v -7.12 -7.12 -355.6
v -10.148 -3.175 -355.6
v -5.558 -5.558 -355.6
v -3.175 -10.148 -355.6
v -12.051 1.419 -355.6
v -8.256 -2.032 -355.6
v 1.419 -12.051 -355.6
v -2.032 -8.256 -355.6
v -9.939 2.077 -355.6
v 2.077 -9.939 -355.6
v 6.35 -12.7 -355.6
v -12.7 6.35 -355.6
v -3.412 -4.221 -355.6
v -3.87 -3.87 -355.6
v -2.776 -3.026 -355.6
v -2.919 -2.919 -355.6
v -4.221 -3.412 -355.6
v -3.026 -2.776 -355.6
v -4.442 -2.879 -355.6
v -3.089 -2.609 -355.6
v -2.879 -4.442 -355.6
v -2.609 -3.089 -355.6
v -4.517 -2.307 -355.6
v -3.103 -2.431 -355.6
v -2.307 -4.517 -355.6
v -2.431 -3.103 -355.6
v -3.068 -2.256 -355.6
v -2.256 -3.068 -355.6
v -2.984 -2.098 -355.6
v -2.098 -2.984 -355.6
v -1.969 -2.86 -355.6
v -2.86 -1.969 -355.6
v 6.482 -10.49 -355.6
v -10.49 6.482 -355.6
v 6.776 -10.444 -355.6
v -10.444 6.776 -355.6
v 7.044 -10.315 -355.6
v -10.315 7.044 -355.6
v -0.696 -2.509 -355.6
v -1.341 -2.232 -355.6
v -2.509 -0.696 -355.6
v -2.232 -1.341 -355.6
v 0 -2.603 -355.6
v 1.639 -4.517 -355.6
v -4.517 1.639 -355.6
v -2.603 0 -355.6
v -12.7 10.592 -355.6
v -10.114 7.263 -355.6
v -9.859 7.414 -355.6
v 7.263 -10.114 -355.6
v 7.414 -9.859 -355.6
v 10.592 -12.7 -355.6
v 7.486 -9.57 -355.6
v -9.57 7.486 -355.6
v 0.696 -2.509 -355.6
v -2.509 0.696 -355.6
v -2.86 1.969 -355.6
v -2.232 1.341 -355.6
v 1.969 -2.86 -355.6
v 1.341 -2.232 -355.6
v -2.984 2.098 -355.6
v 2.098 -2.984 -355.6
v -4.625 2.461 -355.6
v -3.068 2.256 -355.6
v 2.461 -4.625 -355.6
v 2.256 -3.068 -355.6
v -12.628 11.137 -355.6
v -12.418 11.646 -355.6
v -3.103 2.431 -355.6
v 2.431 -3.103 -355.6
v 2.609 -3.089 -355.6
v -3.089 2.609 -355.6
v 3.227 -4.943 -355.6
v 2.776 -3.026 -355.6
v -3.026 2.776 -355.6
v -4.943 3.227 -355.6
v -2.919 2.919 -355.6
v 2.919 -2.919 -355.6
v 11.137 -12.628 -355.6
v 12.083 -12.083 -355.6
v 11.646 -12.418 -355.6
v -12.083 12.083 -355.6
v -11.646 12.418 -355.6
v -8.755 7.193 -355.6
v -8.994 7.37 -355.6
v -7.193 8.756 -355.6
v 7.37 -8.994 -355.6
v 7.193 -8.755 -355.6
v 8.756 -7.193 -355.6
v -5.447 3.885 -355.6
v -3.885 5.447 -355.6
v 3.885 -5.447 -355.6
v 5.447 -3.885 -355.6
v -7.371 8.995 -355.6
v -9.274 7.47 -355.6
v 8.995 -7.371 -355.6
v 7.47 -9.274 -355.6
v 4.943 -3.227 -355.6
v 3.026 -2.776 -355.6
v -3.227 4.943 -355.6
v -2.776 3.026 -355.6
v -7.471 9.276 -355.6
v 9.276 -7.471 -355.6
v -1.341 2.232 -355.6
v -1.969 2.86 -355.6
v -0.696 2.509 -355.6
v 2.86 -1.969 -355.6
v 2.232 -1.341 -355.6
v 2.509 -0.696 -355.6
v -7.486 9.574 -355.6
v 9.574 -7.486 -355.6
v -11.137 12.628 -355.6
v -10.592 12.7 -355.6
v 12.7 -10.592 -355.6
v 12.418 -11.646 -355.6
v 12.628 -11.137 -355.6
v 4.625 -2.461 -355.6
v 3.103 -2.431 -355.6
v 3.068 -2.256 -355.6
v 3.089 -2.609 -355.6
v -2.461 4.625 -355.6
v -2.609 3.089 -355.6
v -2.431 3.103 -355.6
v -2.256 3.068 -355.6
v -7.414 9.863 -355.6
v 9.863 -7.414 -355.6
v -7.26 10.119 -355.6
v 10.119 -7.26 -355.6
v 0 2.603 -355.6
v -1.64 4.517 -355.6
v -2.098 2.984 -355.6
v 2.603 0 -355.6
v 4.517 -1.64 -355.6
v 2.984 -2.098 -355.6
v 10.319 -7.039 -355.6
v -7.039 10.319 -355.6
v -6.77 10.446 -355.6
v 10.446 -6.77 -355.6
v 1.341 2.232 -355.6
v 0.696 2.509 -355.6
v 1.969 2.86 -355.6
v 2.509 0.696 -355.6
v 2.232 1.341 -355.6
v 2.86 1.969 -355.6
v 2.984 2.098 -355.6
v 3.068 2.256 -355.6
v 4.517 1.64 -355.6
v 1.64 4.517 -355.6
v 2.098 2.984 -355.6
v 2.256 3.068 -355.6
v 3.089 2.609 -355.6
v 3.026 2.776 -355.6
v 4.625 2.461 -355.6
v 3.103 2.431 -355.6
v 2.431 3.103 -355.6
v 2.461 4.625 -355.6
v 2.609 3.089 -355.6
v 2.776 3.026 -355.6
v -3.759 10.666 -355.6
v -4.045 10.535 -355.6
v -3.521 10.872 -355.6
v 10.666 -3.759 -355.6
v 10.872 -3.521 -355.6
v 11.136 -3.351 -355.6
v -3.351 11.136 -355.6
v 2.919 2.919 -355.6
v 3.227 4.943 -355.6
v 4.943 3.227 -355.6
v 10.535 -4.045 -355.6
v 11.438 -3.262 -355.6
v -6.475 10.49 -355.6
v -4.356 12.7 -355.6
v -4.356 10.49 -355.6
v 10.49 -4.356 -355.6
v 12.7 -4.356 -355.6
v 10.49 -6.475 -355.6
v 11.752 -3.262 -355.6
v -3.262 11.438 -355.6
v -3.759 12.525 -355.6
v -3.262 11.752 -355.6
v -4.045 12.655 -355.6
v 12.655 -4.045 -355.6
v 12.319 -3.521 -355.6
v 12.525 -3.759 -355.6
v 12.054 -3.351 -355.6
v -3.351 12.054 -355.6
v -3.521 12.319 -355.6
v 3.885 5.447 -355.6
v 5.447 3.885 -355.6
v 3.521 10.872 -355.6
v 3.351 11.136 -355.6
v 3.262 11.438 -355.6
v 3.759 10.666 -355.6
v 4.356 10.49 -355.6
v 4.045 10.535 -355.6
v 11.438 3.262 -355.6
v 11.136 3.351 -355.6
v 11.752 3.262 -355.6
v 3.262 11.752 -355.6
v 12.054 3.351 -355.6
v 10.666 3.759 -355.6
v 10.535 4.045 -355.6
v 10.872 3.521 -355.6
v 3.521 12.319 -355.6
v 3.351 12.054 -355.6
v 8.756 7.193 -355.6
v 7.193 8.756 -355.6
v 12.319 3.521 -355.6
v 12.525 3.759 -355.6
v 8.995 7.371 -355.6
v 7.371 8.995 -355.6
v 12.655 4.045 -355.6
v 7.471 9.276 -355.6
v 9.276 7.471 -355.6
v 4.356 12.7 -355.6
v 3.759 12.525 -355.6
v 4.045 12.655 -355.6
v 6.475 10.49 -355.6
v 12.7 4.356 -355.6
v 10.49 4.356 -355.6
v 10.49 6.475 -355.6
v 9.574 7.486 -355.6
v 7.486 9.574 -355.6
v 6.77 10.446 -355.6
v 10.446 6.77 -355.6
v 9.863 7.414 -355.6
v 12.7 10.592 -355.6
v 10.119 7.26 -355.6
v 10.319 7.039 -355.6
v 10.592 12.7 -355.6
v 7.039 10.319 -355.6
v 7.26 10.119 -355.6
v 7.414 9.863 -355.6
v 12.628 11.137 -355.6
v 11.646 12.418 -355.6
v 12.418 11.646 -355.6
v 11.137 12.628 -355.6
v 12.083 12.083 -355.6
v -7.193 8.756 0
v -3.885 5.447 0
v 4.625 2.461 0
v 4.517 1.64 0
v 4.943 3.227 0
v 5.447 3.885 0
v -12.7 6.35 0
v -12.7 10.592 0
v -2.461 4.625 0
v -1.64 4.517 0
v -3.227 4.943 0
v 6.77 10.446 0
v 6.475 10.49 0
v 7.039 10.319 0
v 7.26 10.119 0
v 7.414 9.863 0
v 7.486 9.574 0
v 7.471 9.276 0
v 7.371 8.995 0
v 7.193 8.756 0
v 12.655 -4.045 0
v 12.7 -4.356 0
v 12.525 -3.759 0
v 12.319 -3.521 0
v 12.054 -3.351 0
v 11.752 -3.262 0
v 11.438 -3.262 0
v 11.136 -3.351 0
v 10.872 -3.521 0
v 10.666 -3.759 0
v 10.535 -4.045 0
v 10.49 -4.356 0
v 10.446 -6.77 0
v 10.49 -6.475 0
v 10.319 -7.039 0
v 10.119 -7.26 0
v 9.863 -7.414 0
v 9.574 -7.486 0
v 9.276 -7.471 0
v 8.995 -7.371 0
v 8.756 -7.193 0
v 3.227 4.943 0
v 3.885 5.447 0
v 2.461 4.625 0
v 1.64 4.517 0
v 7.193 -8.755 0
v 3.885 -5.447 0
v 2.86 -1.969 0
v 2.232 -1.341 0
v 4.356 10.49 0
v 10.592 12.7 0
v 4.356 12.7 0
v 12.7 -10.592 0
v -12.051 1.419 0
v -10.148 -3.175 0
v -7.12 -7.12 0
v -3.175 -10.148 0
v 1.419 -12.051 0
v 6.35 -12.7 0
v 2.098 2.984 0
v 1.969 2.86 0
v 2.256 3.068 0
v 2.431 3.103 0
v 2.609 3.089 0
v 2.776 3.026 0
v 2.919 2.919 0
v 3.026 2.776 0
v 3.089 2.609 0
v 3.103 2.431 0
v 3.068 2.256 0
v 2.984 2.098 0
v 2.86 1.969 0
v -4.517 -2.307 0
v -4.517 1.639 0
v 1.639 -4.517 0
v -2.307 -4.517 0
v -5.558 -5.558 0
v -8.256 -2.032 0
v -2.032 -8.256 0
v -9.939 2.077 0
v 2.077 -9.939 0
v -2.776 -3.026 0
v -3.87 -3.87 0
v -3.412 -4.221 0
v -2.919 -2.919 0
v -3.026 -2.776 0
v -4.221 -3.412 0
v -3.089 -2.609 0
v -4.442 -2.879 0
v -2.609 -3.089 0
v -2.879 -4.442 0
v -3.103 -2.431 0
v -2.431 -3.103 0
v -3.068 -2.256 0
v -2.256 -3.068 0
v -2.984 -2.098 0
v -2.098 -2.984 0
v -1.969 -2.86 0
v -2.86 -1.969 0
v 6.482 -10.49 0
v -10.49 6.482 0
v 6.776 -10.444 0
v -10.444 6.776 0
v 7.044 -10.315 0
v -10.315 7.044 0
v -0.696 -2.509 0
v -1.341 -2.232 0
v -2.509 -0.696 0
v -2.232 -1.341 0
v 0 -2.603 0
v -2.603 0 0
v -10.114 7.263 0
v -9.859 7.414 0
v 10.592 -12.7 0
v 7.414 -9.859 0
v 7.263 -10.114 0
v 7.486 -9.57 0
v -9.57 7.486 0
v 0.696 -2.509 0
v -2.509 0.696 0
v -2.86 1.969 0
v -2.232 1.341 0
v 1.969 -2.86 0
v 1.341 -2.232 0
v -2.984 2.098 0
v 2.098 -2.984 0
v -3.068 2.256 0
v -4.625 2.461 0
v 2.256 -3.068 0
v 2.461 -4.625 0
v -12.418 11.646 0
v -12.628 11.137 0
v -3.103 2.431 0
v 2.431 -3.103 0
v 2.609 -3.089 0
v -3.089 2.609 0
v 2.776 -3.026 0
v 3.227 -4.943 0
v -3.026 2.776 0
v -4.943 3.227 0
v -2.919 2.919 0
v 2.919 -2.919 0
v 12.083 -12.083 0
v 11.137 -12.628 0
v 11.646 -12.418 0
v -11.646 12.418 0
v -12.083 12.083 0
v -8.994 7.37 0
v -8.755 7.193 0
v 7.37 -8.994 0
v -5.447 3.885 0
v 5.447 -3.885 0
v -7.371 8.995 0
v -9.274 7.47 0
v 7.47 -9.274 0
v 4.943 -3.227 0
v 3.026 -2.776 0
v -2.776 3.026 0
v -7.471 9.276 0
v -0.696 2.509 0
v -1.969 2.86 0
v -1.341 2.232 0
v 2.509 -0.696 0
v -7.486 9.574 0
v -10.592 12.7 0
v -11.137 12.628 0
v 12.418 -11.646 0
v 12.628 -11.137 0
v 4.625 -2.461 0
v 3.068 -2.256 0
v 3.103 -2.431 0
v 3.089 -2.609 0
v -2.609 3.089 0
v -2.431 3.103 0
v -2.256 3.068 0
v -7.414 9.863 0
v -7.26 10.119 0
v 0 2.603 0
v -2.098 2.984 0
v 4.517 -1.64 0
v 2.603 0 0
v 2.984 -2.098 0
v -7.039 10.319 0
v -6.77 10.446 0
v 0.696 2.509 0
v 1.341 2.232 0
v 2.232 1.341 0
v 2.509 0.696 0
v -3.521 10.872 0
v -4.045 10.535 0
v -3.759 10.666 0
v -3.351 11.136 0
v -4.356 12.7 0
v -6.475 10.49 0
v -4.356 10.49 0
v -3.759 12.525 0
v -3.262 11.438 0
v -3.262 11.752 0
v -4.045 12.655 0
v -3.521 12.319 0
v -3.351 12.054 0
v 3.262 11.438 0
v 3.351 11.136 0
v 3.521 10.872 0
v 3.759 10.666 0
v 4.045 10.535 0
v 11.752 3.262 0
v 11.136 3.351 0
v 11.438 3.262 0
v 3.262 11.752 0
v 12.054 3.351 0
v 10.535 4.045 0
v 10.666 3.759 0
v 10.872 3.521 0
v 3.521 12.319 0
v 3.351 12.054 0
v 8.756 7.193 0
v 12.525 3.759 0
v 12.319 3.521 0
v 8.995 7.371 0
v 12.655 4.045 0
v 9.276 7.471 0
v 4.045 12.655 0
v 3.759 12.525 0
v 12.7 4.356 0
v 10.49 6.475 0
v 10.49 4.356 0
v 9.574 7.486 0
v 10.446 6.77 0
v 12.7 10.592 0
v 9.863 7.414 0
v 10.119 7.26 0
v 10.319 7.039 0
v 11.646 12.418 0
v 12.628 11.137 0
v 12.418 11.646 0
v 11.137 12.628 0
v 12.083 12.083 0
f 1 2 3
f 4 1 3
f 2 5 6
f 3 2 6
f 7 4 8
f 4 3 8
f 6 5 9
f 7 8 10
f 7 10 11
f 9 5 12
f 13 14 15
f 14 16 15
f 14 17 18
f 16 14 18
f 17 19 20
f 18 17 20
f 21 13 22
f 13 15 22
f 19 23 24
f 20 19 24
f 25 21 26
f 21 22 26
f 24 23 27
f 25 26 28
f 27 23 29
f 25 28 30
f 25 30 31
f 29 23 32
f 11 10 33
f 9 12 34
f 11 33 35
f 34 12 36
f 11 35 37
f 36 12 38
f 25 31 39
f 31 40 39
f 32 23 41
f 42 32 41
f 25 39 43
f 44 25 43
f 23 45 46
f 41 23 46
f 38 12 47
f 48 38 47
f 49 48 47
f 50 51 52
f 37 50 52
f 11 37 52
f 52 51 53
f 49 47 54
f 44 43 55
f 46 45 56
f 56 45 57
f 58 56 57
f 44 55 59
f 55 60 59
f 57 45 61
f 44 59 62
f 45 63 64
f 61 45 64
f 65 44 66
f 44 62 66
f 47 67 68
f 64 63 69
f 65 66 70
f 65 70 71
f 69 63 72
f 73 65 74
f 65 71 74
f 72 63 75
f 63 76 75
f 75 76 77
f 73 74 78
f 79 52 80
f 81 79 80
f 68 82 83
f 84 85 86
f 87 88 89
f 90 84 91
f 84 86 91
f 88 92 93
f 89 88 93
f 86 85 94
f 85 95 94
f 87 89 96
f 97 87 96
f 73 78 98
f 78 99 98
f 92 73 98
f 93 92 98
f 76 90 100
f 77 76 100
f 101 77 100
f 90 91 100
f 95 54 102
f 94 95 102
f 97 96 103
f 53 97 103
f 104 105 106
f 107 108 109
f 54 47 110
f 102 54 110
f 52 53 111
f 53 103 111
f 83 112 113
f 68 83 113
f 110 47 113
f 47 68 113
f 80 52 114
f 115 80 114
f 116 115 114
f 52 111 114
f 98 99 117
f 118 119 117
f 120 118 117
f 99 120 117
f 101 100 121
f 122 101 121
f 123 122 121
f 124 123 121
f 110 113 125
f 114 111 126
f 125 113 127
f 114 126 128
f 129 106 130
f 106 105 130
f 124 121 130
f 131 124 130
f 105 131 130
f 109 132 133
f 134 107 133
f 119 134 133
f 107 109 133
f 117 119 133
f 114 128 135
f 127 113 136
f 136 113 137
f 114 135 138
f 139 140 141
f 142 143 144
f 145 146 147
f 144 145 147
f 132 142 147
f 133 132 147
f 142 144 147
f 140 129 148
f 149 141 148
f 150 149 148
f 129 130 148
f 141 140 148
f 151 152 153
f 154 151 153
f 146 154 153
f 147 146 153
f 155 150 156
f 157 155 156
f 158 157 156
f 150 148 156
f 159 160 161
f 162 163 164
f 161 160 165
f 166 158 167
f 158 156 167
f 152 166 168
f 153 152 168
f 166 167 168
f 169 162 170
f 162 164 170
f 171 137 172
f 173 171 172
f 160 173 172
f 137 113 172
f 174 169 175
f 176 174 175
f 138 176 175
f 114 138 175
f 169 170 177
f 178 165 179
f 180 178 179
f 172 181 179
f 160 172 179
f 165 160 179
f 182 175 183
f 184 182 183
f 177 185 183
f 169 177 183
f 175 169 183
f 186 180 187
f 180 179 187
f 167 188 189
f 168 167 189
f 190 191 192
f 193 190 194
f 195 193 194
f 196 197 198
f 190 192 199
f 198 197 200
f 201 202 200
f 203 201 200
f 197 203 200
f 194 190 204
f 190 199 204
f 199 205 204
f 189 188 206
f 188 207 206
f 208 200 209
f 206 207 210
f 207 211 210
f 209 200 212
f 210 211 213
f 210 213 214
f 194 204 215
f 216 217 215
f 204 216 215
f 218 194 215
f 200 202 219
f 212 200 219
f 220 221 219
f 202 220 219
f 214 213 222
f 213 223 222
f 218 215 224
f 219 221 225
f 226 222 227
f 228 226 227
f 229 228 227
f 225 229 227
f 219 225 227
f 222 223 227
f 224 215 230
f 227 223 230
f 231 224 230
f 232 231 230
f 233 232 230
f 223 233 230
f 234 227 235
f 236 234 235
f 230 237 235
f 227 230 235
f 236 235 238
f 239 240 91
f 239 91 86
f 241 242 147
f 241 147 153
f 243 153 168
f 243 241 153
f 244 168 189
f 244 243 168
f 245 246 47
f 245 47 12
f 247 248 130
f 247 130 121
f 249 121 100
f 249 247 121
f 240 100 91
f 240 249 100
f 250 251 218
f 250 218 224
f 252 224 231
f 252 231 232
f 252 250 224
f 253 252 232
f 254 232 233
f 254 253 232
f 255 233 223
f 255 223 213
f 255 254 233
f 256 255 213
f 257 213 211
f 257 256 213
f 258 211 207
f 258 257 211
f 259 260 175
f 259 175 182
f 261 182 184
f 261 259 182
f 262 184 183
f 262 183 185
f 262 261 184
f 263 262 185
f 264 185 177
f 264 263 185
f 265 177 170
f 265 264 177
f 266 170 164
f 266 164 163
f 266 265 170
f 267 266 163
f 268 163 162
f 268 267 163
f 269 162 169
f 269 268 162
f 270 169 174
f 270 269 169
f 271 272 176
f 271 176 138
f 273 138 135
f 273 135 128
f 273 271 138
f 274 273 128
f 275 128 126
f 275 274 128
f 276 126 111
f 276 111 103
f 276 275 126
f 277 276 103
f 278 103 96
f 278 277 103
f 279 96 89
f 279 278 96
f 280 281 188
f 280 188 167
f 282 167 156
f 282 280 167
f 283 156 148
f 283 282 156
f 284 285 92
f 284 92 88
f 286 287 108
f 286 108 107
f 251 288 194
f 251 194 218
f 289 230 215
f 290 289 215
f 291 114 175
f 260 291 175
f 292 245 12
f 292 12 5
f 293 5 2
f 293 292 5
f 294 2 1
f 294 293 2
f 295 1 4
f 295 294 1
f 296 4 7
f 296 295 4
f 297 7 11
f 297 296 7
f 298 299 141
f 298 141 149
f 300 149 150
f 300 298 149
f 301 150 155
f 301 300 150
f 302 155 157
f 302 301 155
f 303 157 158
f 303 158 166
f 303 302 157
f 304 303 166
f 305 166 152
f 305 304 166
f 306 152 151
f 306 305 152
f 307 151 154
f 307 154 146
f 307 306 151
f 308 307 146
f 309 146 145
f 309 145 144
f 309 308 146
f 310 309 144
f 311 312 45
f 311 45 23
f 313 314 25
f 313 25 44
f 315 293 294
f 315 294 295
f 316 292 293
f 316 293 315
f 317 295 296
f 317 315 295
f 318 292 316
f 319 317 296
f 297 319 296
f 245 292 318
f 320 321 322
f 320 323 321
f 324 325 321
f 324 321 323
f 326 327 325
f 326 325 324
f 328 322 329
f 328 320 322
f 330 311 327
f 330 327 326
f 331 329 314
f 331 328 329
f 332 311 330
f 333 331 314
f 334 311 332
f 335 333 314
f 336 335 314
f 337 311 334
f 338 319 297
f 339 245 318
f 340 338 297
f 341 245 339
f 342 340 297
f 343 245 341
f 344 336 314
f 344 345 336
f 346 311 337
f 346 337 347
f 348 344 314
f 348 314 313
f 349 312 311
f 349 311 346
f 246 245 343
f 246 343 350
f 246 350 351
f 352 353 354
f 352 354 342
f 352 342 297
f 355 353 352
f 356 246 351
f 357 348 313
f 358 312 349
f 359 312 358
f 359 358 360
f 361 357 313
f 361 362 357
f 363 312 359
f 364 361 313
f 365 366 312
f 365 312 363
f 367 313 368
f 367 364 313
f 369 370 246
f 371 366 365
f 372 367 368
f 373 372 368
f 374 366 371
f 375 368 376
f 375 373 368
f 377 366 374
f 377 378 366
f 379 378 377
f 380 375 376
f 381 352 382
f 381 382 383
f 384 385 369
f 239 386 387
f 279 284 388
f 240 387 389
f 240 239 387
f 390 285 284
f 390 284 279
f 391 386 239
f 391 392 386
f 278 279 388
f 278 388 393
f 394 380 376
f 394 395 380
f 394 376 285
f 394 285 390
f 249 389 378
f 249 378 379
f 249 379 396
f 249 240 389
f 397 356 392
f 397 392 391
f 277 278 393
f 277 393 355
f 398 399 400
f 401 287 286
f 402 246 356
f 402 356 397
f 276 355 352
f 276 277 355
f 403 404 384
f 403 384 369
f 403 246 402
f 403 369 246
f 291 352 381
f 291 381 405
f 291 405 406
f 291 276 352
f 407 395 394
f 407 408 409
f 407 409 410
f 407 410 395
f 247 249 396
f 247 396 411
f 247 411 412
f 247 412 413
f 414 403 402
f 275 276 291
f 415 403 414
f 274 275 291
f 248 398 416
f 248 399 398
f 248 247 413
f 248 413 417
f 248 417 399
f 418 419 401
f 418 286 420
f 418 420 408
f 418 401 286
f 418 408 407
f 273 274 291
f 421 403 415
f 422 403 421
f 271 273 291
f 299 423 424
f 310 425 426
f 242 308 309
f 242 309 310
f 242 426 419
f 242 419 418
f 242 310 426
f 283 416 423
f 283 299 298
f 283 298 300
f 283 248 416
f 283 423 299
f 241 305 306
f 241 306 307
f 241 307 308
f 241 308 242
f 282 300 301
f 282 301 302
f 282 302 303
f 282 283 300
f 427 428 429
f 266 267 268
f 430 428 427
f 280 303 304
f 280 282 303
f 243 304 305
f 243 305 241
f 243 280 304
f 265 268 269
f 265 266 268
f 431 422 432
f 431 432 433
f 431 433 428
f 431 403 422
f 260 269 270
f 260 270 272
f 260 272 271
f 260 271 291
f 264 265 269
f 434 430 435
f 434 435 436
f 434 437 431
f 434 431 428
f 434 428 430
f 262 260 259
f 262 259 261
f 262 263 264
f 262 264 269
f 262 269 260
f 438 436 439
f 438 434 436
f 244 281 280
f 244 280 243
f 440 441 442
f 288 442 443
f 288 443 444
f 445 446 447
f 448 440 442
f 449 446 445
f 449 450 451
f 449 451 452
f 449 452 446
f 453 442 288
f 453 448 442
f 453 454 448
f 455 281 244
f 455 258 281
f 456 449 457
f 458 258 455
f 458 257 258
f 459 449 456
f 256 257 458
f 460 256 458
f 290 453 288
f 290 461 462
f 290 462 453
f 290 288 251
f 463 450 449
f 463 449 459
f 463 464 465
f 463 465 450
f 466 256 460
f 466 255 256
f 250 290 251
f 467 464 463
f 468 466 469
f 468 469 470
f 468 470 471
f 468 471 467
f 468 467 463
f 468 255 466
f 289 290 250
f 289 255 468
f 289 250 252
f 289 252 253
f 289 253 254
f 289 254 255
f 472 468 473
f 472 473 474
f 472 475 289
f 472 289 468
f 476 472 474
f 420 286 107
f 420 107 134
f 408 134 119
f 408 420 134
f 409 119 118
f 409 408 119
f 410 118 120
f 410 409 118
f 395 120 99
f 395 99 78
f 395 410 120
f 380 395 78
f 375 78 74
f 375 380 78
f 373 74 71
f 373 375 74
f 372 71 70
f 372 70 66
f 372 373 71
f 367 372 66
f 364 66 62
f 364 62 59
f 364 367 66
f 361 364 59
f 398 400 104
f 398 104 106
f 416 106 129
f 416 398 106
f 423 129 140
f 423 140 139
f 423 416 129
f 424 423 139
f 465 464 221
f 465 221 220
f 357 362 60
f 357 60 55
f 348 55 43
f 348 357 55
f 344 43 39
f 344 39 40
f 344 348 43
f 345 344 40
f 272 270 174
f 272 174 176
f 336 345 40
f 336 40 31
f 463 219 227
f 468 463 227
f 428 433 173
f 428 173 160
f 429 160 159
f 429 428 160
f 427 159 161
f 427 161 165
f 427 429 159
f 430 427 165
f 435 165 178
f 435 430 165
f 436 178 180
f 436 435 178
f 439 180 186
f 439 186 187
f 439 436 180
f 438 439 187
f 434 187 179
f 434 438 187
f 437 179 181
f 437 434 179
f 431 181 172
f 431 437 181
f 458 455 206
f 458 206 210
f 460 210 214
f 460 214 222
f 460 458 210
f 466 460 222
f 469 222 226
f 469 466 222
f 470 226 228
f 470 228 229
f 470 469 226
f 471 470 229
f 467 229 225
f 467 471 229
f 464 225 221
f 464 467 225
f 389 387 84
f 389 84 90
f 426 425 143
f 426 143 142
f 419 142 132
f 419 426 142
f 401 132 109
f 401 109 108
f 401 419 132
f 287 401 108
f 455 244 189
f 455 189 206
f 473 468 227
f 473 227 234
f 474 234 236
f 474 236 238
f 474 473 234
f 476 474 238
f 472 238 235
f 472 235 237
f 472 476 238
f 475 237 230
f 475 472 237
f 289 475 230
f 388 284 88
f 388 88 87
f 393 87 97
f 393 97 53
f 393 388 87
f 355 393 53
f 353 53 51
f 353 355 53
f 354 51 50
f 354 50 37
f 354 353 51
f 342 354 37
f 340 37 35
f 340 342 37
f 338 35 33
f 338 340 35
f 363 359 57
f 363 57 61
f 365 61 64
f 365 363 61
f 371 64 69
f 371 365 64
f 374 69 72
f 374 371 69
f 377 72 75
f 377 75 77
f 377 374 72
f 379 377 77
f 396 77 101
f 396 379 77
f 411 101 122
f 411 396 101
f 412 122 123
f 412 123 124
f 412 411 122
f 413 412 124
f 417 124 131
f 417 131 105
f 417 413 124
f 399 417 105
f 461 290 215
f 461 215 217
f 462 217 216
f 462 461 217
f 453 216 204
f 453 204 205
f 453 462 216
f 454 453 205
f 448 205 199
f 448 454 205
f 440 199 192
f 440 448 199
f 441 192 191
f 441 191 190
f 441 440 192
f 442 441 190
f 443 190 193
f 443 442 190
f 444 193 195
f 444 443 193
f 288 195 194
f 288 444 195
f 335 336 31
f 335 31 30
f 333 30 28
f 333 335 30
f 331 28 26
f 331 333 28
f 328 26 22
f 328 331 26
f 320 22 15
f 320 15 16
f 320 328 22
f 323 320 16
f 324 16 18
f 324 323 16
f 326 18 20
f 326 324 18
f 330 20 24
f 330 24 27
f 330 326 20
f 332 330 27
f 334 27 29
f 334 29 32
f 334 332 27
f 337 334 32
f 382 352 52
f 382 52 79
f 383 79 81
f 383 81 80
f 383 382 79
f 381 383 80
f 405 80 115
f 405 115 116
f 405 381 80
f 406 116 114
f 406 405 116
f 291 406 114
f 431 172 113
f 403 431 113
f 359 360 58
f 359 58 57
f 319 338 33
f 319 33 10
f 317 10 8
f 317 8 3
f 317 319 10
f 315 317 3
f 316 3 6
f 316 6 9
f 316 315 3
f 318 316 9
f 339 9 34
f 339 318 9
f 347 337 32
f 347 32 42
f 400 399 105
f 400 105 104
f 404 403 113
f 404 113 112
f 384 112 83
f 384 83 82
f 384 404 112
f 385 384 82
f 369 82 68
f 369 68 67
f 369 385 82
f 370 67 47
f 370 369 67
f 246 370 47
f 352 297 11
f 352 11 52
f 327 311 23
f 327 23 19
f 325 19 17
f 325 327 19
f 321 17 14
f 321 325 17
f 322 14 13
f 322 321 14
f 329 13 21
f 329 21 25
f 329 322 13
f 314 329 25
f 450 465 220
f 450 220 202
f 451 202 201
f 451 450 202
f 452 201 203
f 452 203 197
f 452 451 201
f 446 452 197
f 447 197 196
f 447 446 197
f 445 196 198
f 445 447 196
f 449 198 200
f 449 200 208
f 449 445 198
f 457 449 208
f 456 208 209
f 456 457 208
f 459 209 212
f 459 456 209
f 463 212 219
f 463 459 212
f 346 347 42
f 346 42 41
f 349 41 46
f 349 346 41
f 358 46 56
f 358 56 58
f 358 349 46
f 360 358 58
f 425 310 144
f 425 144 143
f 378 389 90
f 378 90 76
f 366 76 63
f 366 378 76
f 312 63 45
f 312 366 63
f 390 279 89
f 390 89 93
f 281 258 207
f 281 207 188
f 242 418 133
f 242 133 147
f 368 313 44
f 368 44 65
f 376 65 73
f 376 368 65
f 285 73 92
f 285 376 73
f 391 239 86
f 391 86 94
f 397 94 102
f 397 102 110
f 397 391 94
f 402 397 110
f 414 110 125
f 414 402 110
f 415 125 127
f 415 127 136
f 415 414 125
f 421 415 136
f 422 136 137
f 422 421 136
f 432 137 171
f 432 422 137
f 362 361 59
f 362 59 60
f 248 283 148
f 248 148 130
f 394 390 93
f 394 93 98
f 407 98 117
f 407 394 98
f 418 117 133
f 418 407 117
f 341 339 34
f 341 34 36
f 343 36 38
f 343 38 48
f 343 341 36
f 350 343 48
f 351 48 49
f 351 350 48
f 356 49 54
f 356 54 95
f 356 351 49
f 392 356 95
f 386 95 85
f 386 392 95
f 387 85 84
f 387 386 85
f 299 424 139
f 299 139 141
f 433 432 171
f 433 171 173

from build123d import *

# Parameters (mm, degrees)
EXTRUDE1_DEPTH = 355.6


with BuildPart() as part:
    # Sketch2 → Extrude1 (new body)
    with BuildSketch(Plane.XY):
        with BuildLine():
            Line((-4.3561, 12.7), (-10.5918, 12.7))
            ThreePointArc((-10.5918, 12.7), (-12.082522516, 12.082522516), (-12.7, 10.5918))
            Line((-12.7, 10.5918), (-12.7, 6.35))
            ThreePointArc((-12.7, 6.35), (-7.120384182, -7.120384182), (6.35, -12.7))
            Line((6.35, -12.7), (10.5918, -12.7))
            ThreePointArc((10.5918, -12.7), (12.082522516, -12.082522516), (12.7, -10.5918))
            Line((12.7, -10.5918), (12.7, -4.3561))
            ThreePointArc((12.7, -4.3561), (11.5951, -3.2512), (10.4902, -4.3561))
            Line((10.4902, -4.3561), (10.4902, -6.474899798))
            ThreePointArc((10.4902, -6.474899798), (9.863006367, -7.413561403), (8.75577951, -7.193320288))
            Line((8.75577951, -7.193320288), (5.447103113, -3.88464389))
            ThreePointArc((5.447103113, -3.88464389), (4.758849627, -2.854599758), (4.517167143, -1.63957986))
            Line((4.517167143, -1.63957986), (4.517167143, 1.63957986))
            ThreePointArc((4.517167143, 1.63957986), (4.758849627, 2.854599758), (5.447103113, 3.88464389))
            Line((5.447103113, 3.88464389), (8.75577951, 7.193320288))
            ThreePointArc((8.75577951, 7.193320288), (9.863006367, 7.413561403), (10.4902, 6.474899798))
            Line((10.4902, 6.474899798), (10.4902, 4.3561))
            ThreePointArc((10.4902, 4.3561), (11.5951, 3.2512), (12.7, 4.3561))
            Line((12.7, 4.3561), (12.7, 10.5918))
            ThreePointArc((12.7, 10.5918), (12.082522516, 12.082522516), (10.5918, 12.7))
            Line((10.5918, 12.7), (4.3561, 12.7))
            ThreePointArc((4.3561, 12.7), (3.2512, 11.5951), (4.3561, 10.4902))
            Line((4.3561, 10.4902), (6.474899798, 10.4902))
            ThreePointArc((6.474899798, 10.4902), (7.413561403, 9.863006367), (7.193320288, 8.75577951))
            Line((7.193320288, 8.75577951), (3.88464389, 5.447103113))
            ThreePointArc((3.88464389, 5.447103113), (2.854599758, 4.758849627), (1.63957986, 4.517167143))
            Line((1.63957986, 4.517167143), (-1.63957986, 4.517167143))
            ThreePointArc((-1.63957986, 4.517167143), (-2.854599758, 4.758849627), (-3.88464389, 5.447103113))
            Line((-3.88464389, 5.447103113), (-7.193320288, 8.75577951))
            ThreePointArc((-7.193320288, 8.75577951), (-7.413561403, 9.863006367), (-6.474899798, 10.4902))
            Line((-6.474899798, 10.4902), (-4.3561, 10.4902))
            ThreePointArc((-4.3561, 10.4902), (-3.2512, 11.5951), (-4.3561, 12.7))
        make_face()
        with BuildLine():
            Line((-1.340533428, -2.231856263), (-1.969151357, -2.860474191))
            ThreePointArc((-1.969151357, -2.860474191), (-2.918583239, -2.918583239), (-2.860474191, -1.969151357))
            Line((-2.860474191, -1.969151357), (-2.231856263, -1.340533428))
            ThreePointArc((-2.231856263, -1.340533428), (-2.6035, 0), (-2.231856263, 1.340533428))
            Line((-2.231856263, 1.340533428), (-2.860474191, 1.969151357))
            ThreePointArc((-2.860474191, 1.969151357), (-2.918583239, 2.918583239), (-1.969151357, 2.860474191))
            Line((-1.969151357, 2.860474191), (-1.340533428, 2.231856263))
            ThreePointArc((-1.340533428, 2.231856263), (0, 2.6035), (1.340533428, 2.231856263))
            Line((1.340533428, 2.231856263), (1.969151357, 2.860474191))
            ThreePointArc((1.969151357, 2.860474191), (2.918583239, 2.918583239), (2.860474191, 1.969151357))
            Line((2.860474191, 1.969151357), (2.231856263, 1.340533428))
            ThreePointArc((2.231856263, 1.340533428), (2.6035, 0), (2.231856263, -1.340533428))
            Line((2.231856263, -1.340533428), (2.860474191, -1.969151357))
            ThreePointArc((2.860474191, -1.969151357), (2.918583239, -2.918583239), (1.969151357, -2.860474191))
            Line((1.969151357, -2.860474191), (1.340533428, -2.231856263))
            ThreePointArc((1.340533428, -2.231856263), (0, -2.6035), (-1.340533428, -2.231856263))
        make_face(mode=Mode.SUBTRACT)
        with BuildLine():
            Line((3.884538548, -5.447103113), (7.192726697, -8.755291262))
            ThreePointArc((7.192726697, -8.755291262), (7.414487708, -9.858828287), (6.482287344, -10.489680404))
            ThreePointArc((6.482287344, -10.489680404), (-5.557819617, -5.557819617), (-10.489680404, 6.482287344))
            ThreePointArc((-10.489680404, 6.482287344), (-9.858828287, 7.414487708), (-8.755291262, 7.192726697))
            Line((-8.755291262, 7.192726697), (-5.447103113, 3.884538548))
            ThreePointArc((-5.447103113, 3.884538548), (-4.758849627, 2.854494415), (-4.517167143, 1.639474517))
            Line((-4.517167143, 1.639474517), (-4.517167143, -2.307367143))
            ThreePointArc((-4.517167143, -2.307367143), (-3.869931708, -3.869931708), (-2.307367143, -4.517167143))
            Line((-2.307367143, -4.517167143), (1.639474517, -4.517167143))
            ThreePointArc((1.639474517, -4.517167143), (2.854494415, -4.758849627), (3.884538548, -5.447103113))
        make_face(mode=Mode.SUBTRACT)
    extrude(amount=-EXTRUDE1_DEPTH)


solid = part.part
